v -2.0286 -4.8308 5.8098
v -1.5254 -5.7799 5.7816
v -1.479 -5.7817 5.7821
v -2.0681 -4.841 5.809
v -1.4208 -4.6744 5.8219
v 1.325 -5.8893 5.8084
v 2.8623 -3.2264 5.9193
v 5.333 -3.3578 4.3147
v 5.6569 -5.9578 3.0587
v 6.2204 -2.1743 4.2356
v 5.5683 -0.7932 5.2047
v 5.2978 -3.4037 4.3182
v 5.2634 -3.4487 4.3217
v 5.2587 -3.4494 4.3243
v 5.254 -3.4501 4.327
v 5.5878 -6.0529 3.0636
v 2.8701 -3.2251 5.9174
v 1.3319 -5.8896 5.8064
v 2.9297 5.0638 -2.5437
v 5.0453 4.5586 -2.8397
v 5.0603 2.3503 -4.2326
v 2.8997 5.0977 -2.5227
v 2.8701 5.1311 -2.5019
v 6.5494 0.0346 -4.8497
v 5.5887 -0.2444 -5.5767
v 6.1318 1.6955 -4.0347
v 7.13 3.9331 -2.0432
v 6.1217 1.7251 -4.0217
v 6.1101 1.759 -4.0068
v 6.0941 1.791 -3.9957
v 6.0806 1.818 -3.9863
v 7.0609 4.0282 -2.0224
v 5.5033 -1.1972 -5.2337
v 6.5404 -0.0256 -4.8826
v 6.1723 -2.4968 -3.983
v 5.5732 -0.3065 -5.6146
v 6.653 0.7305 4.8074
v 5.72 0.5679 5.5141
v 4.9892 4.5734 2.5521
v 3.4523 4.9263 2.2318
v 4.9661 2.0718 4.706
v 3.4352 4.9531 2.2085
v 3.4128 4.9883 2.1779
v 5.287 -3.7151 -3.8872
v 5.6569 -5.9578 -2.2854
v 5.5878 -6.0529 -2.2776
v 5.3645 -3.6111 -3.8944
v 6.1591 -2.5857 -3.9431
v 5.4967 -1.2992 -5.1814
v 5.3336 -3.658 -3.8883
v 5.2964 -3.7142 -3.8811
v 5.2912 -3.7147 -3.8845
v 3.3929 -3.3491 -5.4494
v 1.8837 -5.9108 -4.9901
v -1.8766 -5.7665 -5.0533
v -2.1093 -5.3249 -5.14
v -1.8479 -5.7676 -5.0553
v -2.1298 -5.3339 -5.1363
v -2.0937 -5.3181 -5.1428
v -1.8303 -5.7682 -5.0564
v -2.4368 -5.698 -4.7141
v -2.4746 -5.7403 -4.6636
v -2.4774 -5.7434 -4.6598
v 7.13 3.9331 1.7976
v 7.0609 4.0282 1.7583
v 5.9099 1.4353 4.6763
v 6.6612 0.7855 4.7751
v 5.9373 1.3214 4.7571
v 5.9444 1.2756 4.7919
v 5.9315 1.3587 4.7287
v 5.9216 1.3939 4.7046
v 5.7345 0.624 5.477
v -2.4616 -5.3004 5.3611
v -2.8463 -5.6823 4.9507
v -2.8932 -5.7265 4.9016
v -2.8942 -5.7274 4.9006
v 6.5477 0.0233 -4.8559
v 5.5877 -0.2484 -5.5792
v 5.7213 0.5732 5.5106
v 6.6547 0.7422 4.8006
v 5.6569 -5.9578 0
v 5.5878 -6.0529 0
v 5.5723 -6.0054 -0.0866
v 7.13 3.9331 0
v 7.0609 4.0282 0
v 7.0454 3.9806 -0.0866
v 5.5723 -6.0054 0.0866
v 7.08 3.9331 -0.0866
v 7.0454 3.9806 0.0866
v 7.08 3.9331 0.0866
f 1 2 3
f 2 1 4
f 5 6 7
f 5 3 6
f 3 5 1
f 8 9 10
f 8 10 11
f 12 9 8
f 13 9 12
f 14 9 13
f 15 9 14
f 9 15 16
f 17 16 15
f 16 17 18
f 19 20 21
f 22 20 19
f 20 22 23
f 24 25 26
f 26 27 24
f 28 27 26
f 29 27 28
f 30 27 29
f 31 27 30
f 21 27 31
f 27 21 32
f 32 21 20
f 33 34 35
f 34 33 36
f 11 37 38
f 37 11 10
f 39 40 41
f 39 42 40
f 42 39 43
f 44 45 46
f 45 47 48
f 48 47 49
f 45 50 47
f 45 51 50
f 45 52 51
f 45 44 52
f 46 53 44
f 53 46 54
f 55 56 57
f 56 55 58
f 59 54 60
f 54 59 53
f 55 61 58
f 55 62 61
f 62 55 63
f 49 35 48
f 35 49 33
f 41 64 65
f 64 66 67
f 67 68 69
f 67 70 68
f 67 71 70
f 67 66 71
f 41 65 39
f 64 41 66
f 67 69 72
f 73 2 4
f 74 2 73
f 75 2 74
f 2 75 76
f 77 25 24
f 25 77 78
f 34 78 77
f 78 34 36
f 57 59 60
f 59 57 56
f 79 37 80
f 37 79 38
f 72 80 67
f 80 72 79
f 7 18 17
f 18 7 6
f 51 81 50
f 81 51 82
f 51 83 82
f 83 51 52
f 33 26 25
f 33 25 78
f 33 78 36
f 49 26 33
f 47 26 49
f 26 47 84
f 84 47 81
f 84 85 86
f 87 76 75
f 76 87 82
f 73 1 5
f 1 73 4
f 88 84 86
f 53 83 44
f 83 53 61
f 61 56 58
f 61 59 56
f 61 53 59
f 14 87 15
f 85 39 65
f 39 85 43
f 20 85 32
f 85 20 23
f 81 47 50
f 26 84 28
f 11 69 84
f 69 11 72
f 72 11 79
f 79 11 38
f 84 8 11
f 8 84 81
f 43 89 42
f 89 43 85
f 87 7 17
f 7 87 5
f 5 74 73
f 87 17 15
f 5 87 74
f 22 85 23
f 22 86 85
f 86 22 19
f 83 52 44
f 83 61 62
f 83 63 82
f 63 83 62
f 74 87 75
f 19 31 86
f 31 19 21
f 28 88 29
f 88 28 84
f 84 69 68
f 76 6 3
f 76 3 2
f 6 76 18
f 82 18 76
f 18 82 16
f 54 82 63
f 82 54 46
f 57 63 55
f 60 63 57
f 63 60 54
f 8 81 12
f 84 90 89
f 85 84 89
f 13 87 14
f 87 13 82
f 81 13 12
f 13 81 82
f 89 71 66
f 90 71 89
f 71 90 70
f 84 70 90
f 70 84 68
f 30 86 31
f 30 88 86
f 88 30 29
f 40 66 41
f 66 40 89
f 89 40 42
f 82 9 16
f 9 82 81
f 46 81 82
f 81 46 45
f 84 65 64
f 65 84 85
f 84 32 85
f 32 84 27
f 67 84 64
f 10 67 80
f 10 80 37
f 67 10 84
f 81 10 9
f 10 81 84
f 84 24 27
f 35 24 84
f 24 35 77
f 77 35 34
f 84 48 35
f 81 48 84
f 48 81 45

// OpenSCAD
// Auto-generated OpenSCAD file

    inner_points = 10*[[-0.13450932832646978, 0.6137208793216535, -0.49999999999996475], [-0.30970268855061545, -0.5625709645316335, -0.5000000000000352], [-0.13450932832643542, 0.6137208793215885, 0.5000000000000352], [-0.3097026885505811, -0.5625709645316985, 0.49999999999996475], [-0.4022234175933843, 0.052401101187175045, -1.283102338831261], [-0.40222341759329616, 0.05240110118700812, 1.283102338831277], [0.4915267827134717, -0.08071135862540943, -0.8547430824889966], [0.49152678271353045, -0.08071135862552062, 0.8547430824889337], [-1.017331462216076, 0.14401343855176083, -0.499999999999965], [-1.0173314622160416, 0.1440134385516957, 0.500000000000035], [0.7029977653621209, 0.39330793047033674, -7.860303774857193e-15], [0.555685674258319, -0.5957821300472206, -6.713421756971425e-14]];

    outer_points = 10*[[-0.4935961942844095, -0.04399878007182188, -0.5983441385906083], [-0.5063460204819994, 0.04399878007182188, 0.5875939233346719], [0.5063460204819994, -0.04399878007182188, -0.5875939233346719], [0.4935961942844095, 0.04399878007182188, 0.5983441385906083], [-1.2828833411617955, 0.18160496168964152, -0.027267303587311748], [1.283173047764001, 0.18160496168964152, 0.00031994908835159333], [-0.8552676058642261, -0.7195265371946491, 0.04419460685783971], [0.8541197760563402, -0.7195265371946491, 0.06257195110839778], [-0.49933157435504716, 0.8017930567931236, -0.06486192322812147], [0.5006106404113617, 0.8017930567931236, -0.05411170797218501], [0.004675625240909675, -0.8954762230599844, -0.43490804114188575], [-0.006045121001836061, -0.8214830958078585, 0.5622930833658284]];

    // Convex hull for inner set (I)
    module inner_hull() {
        hull() {
            for (p = inner_points) {
                translate(p) sphere(r=0.1);
            }
        }
    }

    // Convex hull for outer set (O) minus inner hull (O \ I)
    module outer_minus_inner() {
        difference() {
            hull() {
                for (p = outer_points) {
                    translate(p) sphere(r=0.1);
                }
            }
            inner_hull(); // Subtract inner hull
        }
    }

    // Convex hull for outer set (O) minus all translated inner hulls
    module outer_minus_AllTranslationInner() {
        difference() {
            hull() {
                for (p = outer_points) {
                    translate(p) sphere(r=0.1);
                }
            }
            hull() {
                translate([0,0,50]) inner_hull();
                translate([0,0,-50]) inner_hull();
            }; // Subtract translated inner hulls
        }
    }

    // Difference between outer_minus_inner and outer_minus_AllTranslationInner
    module outer_minus_inner_diff() {
        difference() {
            // Outer minus inner
            difference() {
                hull() {
                    for (p = outer_points) {
                        translate(p) sphere(r=0.1);
                    }
                }
                inner_hull();
            }

            // Subtract Outer minus AllTranslationInner
            difference() {
                hull() {
                    for (p = outer_points) {
                        translate(p) sphere(r=0.1);
                    }
                }
                hull() {
                    translate([0,0,50]) inner_hull();
                    translate([0,0,-50]) inner_hull();
                };
            }
        }
    }

    // Rendering all with colors applied
    color([1, 1, 0, 1]) outer_minus_inner_diff(); // Opaque yellow
    
